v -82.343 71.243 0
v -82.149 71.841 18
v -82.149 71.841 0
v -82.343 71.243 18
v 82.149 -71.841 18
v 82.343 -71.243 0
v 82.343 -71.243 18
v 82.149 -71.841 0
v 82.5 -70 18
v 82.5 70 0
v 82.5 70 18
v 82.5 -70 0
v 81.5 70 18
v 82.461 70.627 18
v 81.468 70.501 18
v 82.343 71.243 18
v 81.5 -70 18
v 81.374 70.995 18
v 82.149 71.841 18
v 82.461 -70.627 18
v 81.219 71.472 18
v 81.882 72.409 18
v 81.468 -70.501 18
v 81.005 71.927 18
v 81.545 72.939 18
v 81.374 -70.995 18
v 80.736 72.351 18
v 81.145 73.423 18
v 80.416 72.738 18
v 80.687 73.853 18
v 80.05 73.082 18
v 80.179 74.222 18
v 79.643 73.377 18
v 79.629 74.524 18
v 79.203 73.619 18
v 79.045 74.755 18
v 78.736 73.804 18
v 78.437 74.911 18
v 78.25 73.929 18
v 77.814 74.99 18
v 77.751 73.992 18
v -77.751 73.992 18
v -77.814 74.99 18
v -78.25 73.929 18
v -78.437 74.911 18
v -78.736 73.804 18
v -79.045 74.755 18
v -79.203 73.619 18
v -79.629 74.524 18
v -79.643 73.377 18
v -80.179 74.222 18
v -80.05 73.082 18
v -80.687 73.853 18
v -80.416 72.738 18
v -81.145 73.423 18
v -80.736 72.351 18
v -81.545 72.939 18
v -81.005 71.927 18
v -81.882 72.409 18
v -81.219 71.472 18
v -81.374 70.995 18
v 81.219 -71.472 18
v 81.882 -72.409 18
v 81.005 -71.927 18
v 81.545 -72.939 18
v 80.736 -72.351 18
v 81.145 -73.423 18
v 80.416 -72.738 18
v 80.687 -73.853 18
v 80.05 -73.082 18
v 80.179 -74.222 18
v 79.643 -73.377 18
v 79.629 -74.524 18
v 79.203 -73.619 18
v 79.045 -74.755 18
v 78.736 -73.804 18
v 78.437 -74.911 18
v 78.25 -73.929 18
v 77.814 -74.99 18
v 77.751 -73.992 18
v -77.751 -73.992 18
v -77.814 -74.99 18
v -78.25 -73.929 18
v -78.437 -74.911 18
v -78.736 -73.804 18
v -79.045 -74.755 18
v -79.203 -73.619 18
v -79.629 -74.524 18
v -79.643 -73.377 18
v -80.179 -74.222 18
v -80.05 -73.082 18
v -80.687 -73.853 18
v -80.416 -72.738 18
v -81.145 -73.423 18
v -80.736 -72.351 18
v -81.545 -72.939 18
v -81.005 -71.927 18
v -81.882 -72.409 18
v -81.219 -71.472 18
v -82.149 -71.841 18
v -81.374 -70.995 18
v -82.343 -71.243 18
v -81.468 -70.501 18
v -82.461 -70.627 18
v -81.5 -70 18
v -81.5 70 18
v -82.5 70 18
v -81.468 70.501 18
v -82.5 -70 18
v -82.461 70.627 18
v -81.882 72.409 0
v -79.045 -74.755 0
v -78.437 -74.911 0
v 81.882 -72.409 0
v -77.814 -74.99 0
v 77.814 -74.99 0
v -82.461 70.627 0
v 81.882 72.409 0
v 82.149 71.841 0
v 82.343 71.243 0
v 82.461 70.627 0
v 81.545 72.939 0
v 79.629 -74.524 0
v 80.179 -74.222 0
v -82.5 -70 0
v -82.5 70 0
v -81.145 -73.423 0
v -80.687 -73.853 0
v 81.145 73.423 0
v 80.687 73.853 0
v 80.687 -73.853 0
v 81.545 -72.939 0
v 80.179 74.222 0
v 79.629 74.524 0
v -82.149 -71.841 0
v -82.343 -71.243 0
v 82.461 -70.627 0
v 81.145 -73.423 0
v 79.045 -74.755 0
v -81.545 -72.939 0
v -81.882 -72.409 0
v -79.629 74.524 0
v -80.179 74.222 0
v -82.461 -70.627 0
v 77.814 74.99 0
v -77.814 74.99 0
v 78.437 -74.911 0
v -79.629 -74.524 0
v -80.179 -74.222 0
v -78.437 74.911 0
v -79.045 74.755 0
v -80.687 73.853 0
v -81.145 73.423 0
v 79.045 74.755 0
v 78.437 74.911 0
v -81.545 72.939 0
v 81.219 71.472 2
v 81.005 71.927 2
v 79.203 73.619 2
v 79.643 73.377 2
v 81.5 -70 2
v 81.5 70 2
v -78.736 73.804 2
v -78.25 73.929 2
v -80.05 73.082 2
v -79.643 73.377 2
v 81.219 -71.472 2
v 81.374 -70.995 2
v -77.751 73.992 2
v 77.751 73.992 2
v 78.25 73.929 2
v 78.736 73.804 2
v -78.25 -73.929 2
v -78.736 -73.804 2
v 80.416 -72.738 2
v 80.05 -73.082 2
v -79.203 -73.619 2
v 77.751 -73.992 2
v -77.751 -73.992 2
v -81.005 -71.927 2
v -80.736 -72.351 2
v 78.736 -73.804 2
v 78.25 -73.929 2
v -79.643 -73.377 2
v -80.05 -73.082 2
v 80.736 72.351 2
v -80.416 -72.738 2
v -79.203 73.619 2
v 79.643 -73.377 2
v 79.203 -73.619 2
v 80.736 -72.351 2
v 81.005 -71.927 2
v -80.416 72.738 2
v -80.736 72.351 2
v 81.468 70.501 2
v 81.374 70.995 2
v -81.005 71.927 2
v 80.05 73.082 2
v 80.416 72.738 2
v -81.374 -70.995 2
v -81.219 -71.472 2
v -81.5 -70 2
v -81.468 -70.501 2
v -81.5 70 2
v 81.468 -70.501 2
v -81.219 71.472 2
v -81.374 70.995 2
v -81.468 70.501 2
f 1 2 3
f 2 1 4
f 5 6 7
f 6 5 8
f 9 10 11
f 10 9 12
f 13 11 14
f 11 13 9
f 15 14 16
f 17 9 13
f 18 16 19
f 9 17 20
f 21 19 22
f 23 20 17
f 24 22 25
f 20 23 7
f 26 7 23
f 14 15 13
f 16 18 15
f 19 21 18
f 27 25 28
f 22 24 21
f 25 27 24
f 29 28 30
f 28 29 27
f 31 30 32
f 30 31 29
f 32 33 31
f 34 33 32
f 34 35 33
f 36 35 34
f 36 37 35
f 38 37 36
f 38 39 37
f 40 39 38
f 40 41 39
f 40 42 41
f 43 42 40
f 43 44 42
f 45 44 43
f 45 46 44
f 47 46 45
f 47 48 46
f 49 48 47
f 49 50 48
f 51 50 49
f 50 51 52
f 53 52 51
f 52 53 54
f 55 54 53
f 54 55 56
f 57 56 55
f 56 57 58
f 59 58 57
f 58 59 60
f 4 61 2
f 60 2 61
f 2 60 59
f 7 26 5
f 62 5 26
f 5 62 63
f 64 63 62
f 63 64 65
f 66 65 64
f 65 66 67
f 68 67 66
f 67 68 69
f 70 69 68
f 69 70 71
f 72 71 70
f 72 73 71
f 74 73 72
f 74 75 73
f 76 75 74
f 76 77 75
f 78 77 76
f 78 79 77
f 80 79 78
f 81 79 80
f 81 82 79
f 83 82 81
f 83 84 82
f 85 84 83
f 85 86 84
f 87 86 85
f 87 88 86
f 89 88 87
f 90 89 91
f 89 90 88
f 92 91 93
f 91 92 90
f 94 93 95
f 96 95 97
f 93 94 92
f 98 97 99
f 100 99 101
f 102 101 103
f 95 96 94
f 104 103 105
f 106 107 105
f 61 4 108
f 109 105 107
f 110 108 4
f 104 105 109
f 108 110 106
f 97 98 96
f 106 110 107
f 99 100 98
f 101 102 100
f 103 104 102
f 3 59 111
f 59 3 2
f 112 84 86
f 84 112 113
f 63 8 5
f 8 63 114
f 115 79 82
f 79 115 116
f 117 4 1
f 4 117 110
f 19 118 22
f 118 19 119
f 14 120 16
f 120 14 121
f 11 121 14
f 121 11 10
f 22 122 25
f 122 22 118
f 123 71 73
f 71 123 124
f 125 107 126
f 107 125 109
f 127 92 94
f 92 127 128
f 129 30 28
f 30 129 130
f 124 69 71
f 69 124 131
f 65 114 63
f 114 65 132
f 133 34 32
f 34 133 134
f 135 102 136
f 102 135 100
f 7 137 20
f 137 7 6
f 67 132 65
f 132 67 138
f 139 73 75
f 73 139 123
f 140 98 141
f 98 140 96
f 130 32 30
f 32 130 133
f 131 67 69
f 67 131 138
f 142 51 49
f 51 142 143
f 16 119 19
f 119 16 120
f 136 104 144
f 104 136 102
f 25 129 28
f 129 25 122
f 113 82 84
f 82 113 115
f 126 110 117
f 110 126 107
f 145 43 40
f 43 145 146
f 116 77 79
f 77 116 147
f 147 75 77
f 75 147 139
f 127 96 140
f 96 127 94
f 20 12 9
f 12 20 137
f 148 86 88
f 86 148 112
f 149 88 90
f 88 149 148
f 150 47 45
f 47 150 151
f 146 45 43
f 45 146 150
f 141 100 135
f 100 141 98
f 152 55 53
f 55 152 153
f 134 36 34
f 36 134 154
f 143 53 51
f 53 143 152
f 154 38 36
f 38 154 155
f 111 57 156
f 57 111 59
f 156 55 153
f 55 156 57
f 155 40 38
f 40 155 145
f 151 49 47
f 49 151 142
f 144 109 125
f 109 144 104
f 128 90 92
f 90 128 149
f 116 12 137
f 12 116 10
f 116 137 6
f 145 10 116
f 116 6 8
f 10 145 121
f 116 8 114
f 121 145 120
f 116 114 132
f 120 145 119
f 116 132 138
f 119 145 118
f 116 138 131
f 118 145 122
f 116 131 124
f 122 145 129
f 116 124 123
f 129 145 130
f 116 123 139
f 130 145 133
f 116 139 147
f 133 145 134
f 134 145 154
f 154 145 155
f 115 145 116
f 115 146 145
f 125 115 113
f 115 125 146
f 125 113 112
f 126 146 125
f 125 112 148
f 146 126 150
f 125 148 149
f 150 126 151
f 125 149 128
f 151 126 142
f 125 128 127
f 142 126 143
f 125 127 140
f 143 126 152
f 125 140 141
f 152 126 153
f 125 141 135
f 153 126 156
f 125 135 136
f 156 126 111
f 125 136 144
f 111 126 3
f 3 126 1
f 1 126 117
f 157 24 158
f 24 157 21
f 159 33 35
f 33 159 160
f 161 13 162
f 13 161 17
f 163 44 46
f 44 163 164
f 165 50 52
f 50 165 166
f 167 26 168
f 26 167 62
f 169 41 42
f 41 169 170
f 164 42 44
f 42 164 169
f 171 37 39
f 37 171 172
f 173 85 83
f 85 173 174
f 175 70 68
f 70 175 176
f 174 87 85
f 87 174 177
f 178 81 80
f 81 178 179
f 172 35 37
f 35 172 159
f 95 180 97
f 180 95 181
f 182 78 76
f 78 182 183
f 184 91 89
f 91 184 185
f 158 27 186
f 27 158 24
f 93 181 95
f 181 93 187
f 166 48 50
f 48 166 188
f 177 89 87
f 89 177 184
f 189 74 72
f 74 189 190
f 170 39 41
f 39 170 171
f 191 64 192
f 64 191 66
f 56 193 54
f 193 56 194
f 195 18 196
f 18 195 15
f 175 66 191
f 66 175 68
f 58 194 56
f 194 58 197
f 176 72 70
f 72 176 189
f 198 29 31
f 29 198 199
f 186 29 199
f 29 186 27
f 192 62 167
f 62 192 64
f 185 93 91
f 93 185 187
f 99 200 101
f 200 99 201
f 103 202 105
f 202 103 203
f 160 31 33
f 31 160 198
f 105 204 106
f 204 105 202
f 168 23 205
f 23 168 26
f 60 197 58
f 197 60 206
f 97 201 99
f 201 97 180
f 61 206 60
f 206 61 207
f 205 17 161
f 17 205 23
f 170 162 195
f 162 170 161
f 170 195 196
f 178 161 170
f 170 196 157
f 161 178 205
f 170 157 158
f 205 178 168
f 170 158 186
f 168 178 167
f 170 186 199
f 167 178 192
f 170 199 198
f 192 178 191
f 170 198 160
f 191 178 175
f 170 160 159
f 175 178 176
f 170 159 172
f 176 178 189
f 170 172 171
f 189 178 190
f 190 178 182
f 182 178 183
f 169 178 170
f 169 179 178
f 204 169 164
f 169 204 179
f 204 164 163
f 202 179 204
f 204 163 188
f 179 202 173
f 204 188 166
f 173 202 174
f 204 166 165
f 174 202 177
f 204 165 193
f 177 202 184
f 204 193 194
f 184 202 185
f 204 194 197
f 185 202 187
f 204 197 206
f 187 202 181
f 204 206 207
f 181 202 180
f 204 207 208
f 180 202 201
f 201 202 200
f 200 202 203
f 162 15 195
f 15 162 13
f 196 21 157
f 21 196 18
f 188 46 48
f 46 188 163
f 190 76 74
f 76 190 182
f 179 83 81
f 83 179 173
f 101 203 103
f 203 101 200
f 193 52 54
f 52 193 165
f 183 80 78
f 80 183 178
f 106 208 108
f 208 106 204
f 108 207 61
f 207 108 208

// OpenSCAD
$fn = 50;


difference() {
	union() {
		hull() {
			translate(v = [-77.5000000000, 70.0000000000, 0]) {
				cylinder(h = 18, r = 5);
			}
			translate(v = [77.5000000000, 70.0000000000, 0]) {
				cylinder(h = 18, r = 5);
			}
			translate(v = [-77.5000000000, -70.0000000000, 0]) {
				cylinder(h = 18, r = 5);
			}
			translate(v = [77.5000000000, -70.0000000000, 0]) {
				cylinder(h = 18, r = 5);
			}
		}
	}
	union() {
		translate(v = [0, 0, 2]) {
			hull() {
				translate(v = [-77.5000000000, 70.0000000000, 0]) {
					cylinder(h = 16, r = 4);
				}
				translate(v = [77.5000000000, 70.0000000000, 0]) {
					cylinder(h = 16, r = 4);
				}
				translate(v = [-77.5000000000, -70.0000000000, 0]) {
					cylinder(h = 16, r = 4);
				}
				translate(v = [77.5000000000, -70.0000000000, 0]) {
					cylinder(h = 16, r = 4);
				}
			}
		}
	}
}
